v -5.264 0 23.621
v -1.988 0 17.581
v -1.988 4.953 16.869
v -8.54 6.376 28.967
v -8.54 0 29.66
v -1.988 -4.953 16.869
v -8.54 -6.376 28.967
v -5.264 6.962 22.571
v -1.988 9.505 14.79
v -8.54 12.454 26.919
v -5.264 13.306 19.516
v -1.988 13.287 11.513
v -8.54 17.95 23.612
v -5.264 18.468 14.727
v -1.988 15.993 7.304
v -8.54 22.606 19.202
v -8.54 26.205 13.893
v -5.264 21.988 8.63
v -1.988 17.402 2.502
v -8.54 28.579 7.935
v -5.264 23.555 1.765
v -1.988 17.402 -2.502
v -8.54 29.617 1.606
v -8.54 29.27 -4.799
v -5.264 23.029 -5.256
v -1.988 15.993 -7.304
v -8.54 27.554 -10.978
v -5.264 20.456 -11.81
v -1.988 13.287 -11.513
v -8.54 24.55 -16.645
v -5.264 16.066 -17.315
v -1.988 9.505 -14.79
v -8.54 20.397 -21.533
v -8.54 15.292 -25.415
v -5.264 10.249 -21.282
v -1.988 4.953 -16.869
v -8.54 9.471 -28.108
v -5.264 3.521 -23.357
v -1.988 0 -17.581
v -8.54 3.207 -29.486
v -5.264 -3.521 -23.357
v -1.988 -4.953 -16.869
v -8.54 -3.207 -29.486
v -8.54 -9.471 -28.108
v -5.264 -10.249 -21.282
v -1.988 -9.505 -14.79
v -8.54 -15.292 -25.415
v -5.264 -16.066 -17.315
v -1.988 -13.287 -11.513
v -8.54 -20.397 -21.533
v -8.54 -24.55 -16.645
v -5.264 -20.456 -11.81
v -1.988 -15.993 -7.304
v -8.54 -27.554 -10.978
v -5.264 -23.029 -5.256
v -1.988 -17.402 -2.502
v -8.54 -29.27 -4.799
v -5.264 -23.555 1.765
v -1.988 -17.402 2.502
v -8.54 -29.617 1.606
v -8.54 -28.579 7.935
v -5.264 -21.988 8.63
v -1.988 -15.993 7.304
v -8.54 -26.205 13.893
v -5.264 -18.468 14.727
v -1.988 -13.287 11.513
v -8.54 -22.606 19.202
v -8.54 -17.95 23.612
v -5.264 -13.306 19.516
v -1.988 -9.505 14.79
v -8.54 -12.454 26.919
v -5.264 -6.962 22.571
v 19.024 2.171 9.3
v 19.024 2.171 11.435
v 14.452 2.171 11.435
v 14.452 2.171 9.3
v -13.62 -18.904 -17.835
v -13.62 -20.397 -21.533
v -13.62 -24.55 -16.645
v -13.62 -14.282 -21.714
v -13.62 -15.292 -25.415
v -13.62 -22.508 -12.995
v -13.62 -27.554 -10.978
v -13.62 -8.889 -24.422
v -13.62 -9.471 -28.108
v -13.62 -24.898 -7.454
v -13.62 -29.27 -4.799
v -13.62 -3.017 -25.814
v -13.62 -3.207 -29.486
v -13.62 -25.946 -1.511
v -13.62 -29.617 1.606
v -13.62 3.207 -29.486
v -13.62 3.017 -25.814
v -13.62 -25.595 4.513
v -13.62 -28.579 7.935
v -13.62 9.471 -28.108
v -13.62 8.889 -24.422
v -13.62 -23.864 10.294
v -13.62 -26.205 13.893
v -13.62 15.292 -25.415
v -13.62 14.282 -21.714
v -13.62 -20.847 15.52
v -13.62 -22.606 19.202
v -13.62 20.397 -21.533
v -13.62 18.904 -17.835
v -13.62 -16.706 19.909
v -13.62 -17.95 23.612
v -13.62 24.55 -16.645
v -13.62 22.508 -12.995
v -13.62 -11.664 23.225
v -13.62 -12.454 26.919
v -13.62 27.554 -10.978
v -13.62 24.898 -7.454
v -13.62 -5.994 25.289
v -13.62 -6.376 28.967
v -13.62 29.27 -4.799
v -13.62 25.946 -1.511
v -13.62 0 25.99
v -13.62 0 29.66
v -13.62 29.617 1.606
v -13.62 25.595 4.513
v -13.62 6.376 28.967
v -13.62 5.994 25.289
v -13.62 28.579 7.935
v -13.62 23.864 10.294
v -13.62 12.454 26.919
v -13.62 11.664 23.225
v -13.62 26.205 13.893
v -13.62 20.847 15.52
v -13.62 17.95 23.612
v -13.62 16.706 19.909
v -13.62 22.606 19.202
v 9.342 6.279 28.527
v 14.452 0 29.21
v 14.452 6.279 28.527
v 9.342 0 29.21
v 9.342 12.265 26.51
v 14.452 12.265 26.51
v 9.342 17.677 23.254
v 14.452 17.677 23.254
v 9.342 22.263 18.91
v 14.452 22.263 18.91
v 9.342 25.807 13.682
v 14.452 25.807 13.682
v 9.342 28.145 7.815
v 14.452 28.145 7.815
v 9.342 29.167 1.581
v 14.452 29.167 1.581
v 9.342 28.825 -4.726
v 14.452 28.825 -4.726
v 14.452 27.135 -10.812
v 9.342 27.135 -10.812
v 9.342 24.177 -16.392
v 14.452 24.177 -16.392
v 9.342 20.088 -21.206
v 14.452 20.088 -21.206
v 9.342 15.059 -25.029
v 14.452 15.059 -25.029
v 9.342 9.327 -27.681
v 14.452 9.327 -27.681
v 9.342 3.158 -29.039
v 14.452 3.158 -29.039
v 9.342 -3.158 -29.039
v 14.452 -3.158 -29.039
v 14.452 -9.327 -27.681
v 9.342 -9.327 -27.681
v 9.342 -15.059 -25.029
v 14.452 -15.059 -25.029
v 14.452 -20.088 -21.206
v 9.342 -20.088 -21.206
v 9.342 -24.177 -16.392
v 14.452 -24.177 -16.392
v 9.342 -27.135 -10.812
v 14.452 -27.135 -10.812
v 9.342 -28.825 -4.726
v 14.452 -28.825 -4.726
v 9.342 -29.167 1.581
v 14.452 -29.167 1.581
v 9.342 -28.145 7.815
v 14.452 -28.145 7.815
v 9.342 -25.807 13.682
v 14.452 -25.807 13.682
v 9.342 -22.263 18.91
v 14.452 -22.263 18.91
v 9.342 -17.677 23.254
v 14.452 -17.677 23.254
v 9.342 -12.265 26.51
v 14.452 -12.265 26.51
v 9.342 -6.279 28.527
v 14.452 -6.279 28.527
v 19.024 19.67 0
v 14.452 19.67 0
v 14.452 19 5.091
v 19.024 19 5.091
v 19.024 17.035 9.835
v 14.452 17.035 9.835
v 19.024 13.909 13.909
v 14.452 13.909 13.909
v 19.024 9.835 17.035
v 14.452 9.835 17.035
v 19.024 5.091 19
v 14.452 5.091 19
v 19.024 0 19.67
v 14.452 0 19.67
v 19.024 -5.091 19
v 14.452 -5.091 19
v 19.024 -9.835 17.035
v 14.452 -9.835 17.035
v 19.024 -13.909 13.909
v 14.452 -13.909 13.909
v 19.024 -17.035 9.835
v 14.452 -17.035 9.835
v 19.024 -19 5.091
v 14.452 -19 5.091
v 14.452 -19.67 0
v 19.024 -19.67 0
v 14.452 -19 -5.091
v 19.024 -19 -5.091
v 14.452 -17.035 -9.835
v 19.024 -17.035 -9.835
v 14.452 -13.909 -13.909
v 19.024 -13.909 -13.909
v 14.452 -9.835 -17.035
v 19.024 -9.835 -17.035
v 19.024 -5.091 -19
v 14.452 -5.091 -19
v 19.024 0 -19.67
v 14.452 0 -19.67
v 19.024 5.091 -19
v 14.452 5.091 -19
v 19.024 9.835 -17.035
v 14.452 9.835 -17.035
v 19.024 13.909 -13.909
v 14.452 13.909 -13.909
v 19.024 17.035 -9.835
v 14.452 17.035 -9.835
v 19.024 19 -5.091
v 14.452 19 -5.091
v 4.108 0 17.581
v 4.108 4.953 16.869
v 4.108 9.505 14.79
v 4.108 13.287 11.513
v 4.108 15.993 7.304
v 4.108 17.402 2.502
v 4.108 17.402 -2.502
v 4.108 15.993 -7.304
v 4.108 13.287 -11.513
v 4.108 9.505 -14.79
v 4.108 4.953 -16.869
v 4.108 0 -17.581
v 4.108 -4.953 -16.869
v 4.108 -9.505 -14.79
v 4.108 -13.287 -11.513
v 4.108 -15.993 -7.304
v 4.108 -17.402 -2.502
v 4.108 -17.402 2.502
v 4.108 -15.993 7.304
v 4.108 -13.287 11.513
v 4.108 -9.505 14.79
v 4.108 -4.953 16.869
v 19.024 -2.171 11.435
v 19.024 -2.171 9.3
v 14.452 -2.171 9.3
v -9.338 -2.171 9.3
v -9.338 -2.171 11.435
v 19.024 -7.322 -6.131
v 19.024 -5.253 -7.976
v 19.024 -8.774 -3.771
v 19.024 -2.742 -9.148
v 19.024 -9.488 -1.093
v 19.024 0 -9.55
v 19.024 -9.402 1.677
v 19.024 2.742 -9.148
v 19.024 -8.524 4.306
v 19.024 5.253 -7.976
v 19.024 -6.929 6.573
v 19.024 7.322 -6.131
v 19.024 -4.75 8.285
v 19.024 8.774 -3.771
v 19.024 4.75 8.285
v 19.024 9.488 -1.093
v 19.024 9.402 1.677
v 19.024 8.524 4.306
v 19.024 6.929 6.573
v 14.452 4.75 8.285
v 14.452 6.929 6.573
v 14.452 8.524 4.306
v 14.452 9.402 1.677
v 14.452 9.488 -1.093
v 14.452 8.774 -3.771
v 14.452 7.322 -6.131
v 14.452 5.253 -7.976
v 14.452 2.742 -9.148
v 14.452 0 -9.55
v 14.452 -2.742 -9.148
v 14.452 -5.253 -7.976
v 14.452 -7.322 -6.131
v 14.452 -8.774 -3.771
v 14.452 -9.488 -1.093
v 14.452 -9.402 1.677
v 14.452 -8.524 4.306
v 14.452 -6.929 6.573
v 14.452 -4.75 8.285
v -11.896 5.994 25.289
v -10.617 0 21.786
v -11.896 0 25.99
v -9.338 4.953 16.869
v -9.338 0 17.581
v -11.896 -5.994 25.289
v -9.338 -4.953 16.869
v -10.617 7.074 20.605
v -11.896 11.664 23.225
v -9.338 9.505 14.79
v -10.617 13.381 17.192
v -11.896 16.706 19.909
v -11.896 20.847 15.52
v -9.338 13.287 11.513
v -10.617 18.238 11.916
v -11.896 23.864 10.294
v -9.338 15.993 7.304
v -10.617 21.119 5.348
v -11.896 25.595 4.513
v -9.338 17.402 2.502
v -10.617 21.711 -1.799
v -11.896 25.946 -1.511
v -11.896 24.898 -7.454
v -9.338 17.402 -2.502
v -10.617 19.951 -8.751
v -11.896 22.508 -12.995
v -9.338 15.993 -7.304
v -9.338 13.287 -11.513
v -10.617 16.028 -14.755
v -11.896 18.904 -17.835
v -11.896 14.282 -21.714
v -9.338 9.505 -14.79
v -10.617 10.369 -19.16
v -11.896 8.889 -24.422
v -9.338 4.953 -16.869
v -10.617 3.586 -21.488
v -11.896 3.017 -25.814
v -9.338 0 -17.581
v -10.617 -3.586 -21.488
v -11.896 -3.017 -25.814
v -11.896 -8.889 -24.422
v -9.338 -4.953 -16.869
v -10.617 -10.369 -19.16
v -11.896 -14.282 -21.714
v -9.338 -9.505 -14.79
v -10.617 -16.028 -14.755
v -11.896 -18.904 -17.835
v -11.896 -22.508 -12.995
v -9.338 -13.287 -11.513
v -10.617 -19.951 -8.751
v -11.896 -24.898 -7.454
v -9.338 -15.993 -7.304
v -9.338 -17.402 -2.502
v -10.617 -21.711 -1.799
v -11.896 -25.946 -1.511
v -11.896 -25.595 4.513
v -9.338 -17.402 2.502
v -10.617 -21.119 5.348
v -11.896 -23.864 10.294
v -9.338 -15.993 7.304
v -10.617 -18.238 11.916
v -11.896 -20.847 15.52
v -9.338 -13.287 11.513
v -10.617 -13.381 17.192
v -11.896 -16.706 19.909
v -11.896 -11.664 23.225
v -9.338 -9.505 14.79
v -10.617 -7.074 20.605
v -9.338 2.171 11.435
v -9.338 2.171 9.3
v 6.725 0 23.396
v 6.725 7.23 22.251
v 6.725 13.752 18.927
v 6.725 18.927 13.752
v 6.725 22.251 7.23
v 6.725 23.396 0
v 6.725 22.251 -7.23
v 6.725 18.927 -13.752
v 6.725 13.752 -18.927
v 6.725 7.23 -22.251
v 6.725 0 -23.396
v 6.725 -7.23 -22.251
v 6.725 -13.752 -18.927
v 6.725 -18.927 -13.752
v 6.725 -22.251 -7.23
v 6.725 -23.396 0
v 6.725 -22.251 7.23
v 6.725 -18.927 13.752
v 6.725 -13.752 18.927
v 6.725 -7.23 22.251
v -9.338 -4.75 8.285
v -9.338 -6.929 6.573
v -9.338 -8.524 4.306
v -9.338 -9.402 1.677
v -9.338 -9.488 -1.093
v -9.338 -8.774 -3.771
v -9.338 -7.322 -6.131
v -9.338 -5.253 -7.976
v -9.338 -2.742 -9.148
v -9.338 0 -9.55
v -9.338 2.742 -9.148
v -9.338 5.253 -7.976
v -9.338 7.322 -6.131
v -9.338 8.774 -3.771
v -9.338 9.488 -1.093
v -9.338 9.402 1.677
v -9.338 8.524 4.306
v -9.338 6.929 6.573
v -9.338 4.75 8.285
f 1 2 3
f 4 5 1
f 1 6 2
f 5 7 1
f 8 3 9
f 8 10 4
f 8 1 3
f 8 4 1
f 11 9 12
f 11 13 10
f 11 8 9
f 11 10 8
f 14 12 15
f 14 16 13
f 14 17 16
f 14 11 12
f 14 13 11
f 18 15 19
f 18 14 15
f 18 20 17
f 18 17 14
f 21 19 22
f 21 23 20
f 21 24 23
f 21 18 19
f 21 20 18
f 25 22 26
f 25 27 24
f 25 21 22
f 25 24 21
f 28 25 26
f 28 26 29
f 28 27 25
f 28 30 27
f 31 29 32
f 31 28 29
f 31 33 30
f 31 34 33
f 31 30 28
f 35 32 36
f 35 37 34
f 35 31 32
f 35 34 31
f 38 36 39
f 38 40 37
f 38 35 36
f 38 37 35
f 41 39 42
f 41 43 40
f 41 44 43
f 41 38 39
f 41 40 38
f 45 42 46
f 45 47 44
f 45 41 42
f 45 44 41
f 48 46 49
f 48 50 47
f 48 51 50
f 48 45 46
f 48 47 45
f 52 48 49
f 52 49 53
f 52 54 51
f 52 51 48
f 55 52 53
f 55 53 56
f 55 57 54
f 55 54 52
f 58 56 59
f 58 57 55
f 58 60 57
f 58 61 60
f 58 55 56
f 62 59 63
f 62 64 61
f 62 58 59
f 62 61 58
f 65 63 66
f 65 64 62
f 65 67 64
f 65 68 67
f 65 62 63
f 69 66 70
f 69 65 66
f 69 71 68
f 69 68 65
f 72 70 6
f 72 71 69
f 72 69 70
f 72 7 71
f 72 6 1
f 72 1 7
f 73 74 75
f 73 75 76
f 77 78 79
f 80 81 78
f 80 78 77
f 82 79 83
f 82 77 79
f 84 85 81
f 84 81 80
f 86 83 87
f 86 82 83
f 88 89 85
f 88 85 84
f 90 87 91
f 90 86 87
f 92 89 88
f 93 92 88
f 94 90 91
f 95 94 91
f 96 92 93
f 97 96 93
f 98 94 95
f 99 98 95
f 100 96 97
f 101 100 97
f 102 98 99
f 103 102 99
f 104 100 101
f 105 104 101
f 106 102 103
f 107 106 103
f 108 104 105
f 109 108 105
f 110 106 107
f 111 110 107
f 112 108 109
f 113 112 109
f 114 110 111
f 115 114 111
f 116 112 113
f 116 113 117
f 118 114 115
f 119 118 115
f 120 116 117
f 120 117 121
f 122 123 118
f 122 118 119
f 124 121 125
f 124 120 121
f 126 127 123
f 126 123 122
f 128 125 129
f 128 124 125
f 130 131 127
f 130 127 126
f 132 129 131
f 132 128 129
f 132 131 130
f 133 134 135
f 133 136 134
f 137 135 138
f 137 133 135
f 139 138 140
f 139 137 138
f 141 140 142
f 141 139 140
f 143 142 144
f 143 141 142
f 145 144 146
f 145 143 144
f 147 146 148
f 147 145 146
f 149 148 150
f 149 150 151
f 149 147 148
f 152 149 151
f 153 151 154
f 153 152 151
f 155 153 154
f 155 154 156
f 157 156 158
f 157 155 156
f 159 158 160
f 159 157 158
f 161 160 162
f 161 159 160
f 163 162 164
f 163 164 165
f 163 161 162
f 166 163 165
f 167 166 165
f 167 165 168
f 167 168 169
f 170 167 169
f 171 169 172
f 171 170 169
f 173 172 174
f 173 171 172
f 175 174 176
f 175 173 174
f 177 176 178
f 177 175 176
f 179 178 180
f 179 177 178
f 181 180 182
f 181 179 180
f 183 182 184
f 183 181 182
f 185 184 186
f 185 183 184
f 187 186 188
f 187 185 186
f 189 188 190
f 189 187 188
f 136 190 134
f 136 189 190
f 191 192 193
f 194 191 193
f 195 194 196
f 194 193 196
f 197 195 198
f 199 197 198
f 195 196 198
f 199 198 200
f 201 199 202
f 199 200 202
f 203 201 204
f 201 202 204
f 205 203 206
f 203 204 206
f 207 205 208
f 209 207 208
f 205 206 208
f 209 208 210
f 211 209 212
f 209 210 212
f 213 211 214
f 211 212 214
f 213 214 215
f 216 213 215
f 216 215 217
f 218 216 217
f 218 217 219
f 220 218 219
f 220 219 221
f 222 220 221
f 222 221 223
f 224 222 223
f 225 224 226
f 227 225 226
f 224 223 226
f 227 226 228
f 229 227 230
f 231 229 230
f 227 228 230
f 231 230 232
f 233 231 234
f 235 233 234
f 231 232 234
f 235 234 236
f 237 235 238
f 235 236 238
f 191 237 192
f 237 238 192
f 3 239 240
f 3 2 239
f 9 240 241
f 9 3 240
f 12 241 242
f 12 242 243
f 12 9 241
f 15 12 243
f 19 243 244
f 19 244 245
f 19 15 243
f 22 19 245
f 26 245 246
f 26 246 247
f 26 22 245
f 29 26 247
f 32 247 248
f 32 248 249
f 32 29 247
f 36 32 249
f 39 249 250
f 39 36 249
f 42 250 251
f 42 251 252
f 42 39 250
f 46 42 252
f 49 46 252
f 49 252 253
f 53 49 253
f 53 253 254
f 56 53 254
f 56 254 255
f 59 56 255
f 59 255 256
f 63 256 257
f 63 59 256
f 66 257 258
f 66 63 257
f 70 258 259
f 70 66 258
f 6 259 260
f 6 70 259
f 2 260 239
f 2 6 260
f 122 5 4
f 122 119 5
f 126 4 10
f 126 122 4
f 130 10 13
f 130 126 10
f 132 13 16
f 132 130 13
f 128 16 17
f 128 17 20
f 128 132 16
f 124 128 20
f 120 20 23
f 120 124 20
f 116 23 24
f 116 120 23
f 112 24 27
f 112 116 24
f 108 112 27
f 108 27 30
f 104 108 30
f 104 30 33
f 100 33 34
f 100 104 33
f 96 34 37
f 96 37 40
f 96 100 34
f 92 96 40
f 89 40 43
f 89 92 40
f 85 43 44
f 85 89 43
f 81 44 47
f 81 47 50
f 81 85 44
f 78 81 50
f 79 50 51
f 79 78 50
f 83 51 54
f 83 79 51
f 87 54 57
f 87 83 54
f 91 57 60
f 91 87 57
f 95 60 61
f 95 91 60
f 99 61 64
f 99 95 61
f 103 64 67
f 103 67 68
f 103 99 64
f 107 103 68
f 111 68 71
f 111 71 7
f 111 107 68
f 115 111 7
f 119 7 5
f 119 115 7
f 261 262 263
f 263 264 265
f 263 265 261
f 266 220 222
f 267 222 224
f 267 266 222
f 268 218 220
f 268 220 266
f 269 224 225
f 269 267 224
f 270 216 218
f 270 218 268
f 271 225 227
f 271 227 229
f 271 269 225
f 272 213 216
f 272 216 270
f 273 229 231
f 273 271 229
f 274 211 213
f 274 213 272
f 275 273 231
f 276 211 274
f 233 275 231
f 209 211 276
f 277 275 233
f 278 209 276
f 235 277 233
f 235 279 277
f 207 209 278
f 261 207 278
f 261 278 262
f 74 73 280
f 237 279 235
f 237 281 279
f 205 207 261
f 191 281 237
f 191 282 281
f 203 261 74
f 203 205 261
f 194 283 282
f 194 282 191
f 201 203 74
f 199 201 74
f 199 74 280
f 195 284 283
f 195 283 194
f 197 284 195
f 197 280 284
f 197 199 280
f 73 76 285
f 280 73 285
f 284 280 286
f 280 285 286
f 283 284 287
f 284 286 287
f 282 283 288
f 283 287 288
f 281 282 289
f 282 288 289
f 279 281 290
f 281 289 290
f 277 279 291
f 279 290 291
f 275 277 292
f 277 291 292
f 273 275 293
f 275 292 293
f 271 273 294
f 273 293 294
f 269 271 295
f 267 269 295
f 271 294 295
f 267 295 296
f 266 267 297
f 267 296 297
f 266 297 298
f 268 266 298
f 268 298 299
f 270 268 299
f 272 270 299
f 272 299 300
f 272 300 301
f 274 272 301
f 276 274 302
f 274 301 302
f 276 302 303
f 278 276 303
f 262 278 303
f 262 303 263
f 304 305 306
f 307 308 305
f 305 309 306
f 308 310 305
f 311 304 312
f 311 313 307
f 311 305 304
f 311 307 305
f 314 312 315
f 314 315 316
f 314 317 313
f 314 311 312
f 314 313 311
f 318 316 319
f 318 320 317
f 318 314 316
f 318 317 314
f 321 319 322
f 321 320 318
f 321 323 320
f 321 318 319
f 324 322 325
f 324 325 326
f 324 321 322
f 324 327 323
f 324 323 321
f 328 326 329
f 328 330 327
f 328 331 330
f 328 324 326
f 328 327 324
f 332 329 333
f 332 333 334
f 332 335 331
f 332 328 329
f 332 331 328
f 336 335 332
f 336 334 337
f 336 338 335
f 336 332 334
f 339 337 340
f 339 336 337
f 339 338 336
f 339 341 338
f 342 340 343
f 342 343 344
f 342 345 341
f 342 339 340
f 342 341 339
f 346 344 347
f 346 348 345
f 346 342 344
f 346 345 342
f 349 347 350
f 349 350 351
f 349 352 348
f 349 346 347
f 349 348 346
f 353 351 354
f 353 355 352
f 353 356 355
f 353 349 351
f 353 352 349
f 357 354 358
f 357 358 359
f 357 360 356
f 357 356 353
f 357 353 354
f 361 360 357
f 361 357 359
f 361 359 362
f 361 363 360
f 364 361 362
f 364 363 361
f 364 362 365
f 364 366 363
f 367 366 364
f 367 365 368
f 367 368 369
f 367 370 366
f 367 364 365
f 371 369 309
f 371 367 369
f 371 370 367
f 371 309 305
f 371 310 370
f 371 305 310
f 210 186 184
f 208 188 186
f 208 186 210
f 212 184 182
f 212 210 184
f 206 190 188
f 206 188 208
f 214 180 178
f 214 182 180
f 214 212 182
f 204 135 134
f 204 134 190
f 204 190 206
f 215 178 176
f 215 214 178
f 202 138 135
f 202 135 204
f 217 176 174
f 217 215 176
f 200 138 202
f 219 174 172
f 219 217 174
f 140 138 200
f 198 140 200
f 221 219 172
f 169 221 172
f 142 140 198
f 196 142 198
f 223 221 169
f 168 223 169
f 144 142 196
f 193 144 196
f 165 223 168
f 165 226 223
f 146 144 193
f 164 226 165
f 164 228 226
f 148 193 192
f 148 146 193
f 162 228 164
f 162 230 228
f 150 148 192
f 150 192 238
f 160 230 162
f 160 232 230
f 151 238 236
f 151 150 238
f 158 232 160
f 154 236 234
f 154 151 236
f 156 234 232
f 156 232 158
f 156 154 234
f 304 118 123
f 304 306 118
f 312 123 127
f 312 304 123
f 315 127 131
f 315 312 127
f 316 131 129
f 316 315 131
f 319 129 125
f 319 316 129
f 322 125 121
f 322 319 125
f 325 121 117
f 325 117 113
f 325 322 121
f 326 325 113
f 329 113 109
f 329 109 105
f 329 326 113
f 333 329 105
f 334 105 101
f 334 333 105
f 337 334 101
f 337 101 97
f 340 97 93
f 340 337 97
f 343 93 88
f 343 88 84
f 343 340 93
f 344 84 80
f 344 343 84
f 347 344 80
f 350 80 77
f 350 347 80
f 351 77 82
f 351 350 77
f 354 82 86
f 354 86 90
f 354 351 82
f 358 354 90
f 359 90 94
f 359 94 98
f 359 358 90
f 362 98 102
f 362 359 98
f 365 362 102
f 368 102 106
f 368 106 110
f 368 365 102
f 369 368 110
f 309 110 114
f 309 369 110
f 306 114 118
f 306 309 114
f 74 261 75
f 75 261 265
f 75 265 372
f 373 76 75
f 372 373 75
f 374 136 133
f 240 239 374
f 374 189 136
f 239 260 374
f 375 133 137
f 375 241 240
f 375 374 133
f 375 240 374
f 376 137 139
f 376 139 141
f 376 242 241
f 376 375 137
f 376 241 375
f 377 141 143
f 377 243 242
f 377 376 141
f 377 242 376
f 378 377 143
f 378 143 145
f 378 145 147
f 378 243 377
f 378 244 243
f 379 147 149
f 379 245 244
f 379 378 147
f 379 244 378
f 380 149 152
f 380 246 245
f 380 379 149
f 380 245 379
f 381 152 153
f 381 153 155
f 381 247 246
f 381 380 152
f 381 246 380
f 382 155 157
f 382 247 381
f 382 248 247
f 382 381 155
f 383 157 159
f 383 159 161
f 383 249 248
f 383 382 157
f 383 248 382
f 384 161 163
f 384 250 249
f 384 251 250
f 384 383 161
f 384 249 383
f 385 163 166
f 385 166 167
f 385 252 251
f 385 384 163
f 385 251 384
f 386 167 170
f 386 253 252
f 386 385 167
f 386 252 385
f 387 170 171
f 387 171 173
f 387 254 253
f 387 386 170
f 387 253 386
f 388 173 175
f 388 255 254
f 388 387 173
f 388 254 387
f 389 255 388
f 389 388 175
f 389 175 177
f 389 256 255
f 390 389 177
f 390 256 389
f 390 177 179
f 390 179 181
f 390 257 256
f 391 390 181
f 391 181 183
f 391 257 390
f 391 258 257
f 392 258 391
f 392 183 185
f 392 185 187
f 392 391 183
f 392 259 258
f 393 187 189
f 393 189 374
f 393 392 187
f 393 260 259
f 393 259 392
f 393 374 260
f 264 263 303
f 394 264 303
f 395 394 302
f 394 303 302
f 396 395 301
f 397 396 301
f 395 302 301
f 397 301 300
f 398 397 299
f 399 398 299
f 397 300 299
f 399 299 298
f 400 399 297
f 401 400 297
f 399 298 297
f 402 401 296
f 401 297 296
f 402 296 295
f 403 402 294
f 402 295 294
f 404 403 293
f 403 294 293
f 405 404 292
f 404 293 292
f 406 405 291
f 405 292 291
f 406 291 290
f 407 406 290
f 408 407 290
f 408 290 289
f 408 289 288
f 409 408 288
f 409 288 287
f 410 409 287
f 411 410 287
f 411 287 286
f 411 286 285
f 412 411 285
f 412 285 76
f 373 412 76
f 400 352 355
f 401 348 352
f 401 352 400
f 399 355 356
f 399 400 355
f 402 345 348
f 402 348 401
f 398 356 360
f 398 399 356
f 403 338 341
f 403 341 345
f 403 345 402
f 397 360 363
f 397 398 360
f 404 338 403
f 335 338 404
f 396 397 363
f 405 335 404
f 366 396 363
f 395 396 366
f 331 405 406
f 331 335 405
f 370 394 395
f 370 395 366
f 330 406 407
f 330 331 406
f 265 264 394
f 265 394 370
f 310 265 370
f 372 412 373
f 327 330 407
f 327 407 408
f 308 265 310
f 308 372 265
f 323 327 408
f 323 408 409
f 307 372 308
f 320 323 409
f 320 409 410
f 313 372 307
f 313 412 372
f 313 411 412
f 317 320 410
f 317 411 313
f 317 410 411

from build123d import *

# Parameters (mm, degrees)
F3_DEPTH = 49.784
F4_R     = 19.670017
F5_DEPTH = 4.572


with BuildPart() as f1:
    # F0 (on Front) → F1 (revolve)
    with BuildSketch(Plane.XZ):
        Polygon((4.108123, 17.581305), (-1.987877, 17.581305), (-8.539953, 29.660342), (-13.619953, 29.660342), (-13.619953, 25.989784), (-11.896132, 25.989784), (-9.338465, 17.581305), (-9.338465, 0), (14.451806, 0), (14.451806, 29.21), (9.341924, 29.21), align=None)
    revolve(axis=Axis((2.55667, 0, 0), (-1, 0, 0)))

    # F2 (on face) → F3 (cut)
    with BuildSketch(Plane.YZ.offset(14.451806)):
        with BuildLine():
            Line((-2.171075, 11.435072), (-2.171075, 9.300354))
            ThreePointArc((-2.171075, 9.300354), (0, -9.5504), (2.171075, 9.300354))
            Line((2.171075, 9.300354), (2.171075, 11.435072))
            Line((2.171075, 11.435072), (-2.171075, 11.435072))
        make_face()
    extrude(amount=-F3_DEPTH, mode=Mode.SUBTRACT)

    # F4 (on face) → F5 (join)
    with BuildSketch(Plane.YZ.offset(14.451806)):
        Circle(F4_R)
        with BuildLine():
            Line((2.171075, 11.435072), (2.171075, 9.300354))
            ThreePointArc((2.171075, 9.300354), (0, -9.5504), (-2.171075, 9.300354))
            Line((-2.171075, 9.300354), (-2.171075, 11.435072))
            Line((-2.171075, 11.435072), (2.171075, 11.435072))
        make_face(mode=Mode.SUBTRACT)
    extrude(amount=F5_DEPTH)


solid = f1.part
